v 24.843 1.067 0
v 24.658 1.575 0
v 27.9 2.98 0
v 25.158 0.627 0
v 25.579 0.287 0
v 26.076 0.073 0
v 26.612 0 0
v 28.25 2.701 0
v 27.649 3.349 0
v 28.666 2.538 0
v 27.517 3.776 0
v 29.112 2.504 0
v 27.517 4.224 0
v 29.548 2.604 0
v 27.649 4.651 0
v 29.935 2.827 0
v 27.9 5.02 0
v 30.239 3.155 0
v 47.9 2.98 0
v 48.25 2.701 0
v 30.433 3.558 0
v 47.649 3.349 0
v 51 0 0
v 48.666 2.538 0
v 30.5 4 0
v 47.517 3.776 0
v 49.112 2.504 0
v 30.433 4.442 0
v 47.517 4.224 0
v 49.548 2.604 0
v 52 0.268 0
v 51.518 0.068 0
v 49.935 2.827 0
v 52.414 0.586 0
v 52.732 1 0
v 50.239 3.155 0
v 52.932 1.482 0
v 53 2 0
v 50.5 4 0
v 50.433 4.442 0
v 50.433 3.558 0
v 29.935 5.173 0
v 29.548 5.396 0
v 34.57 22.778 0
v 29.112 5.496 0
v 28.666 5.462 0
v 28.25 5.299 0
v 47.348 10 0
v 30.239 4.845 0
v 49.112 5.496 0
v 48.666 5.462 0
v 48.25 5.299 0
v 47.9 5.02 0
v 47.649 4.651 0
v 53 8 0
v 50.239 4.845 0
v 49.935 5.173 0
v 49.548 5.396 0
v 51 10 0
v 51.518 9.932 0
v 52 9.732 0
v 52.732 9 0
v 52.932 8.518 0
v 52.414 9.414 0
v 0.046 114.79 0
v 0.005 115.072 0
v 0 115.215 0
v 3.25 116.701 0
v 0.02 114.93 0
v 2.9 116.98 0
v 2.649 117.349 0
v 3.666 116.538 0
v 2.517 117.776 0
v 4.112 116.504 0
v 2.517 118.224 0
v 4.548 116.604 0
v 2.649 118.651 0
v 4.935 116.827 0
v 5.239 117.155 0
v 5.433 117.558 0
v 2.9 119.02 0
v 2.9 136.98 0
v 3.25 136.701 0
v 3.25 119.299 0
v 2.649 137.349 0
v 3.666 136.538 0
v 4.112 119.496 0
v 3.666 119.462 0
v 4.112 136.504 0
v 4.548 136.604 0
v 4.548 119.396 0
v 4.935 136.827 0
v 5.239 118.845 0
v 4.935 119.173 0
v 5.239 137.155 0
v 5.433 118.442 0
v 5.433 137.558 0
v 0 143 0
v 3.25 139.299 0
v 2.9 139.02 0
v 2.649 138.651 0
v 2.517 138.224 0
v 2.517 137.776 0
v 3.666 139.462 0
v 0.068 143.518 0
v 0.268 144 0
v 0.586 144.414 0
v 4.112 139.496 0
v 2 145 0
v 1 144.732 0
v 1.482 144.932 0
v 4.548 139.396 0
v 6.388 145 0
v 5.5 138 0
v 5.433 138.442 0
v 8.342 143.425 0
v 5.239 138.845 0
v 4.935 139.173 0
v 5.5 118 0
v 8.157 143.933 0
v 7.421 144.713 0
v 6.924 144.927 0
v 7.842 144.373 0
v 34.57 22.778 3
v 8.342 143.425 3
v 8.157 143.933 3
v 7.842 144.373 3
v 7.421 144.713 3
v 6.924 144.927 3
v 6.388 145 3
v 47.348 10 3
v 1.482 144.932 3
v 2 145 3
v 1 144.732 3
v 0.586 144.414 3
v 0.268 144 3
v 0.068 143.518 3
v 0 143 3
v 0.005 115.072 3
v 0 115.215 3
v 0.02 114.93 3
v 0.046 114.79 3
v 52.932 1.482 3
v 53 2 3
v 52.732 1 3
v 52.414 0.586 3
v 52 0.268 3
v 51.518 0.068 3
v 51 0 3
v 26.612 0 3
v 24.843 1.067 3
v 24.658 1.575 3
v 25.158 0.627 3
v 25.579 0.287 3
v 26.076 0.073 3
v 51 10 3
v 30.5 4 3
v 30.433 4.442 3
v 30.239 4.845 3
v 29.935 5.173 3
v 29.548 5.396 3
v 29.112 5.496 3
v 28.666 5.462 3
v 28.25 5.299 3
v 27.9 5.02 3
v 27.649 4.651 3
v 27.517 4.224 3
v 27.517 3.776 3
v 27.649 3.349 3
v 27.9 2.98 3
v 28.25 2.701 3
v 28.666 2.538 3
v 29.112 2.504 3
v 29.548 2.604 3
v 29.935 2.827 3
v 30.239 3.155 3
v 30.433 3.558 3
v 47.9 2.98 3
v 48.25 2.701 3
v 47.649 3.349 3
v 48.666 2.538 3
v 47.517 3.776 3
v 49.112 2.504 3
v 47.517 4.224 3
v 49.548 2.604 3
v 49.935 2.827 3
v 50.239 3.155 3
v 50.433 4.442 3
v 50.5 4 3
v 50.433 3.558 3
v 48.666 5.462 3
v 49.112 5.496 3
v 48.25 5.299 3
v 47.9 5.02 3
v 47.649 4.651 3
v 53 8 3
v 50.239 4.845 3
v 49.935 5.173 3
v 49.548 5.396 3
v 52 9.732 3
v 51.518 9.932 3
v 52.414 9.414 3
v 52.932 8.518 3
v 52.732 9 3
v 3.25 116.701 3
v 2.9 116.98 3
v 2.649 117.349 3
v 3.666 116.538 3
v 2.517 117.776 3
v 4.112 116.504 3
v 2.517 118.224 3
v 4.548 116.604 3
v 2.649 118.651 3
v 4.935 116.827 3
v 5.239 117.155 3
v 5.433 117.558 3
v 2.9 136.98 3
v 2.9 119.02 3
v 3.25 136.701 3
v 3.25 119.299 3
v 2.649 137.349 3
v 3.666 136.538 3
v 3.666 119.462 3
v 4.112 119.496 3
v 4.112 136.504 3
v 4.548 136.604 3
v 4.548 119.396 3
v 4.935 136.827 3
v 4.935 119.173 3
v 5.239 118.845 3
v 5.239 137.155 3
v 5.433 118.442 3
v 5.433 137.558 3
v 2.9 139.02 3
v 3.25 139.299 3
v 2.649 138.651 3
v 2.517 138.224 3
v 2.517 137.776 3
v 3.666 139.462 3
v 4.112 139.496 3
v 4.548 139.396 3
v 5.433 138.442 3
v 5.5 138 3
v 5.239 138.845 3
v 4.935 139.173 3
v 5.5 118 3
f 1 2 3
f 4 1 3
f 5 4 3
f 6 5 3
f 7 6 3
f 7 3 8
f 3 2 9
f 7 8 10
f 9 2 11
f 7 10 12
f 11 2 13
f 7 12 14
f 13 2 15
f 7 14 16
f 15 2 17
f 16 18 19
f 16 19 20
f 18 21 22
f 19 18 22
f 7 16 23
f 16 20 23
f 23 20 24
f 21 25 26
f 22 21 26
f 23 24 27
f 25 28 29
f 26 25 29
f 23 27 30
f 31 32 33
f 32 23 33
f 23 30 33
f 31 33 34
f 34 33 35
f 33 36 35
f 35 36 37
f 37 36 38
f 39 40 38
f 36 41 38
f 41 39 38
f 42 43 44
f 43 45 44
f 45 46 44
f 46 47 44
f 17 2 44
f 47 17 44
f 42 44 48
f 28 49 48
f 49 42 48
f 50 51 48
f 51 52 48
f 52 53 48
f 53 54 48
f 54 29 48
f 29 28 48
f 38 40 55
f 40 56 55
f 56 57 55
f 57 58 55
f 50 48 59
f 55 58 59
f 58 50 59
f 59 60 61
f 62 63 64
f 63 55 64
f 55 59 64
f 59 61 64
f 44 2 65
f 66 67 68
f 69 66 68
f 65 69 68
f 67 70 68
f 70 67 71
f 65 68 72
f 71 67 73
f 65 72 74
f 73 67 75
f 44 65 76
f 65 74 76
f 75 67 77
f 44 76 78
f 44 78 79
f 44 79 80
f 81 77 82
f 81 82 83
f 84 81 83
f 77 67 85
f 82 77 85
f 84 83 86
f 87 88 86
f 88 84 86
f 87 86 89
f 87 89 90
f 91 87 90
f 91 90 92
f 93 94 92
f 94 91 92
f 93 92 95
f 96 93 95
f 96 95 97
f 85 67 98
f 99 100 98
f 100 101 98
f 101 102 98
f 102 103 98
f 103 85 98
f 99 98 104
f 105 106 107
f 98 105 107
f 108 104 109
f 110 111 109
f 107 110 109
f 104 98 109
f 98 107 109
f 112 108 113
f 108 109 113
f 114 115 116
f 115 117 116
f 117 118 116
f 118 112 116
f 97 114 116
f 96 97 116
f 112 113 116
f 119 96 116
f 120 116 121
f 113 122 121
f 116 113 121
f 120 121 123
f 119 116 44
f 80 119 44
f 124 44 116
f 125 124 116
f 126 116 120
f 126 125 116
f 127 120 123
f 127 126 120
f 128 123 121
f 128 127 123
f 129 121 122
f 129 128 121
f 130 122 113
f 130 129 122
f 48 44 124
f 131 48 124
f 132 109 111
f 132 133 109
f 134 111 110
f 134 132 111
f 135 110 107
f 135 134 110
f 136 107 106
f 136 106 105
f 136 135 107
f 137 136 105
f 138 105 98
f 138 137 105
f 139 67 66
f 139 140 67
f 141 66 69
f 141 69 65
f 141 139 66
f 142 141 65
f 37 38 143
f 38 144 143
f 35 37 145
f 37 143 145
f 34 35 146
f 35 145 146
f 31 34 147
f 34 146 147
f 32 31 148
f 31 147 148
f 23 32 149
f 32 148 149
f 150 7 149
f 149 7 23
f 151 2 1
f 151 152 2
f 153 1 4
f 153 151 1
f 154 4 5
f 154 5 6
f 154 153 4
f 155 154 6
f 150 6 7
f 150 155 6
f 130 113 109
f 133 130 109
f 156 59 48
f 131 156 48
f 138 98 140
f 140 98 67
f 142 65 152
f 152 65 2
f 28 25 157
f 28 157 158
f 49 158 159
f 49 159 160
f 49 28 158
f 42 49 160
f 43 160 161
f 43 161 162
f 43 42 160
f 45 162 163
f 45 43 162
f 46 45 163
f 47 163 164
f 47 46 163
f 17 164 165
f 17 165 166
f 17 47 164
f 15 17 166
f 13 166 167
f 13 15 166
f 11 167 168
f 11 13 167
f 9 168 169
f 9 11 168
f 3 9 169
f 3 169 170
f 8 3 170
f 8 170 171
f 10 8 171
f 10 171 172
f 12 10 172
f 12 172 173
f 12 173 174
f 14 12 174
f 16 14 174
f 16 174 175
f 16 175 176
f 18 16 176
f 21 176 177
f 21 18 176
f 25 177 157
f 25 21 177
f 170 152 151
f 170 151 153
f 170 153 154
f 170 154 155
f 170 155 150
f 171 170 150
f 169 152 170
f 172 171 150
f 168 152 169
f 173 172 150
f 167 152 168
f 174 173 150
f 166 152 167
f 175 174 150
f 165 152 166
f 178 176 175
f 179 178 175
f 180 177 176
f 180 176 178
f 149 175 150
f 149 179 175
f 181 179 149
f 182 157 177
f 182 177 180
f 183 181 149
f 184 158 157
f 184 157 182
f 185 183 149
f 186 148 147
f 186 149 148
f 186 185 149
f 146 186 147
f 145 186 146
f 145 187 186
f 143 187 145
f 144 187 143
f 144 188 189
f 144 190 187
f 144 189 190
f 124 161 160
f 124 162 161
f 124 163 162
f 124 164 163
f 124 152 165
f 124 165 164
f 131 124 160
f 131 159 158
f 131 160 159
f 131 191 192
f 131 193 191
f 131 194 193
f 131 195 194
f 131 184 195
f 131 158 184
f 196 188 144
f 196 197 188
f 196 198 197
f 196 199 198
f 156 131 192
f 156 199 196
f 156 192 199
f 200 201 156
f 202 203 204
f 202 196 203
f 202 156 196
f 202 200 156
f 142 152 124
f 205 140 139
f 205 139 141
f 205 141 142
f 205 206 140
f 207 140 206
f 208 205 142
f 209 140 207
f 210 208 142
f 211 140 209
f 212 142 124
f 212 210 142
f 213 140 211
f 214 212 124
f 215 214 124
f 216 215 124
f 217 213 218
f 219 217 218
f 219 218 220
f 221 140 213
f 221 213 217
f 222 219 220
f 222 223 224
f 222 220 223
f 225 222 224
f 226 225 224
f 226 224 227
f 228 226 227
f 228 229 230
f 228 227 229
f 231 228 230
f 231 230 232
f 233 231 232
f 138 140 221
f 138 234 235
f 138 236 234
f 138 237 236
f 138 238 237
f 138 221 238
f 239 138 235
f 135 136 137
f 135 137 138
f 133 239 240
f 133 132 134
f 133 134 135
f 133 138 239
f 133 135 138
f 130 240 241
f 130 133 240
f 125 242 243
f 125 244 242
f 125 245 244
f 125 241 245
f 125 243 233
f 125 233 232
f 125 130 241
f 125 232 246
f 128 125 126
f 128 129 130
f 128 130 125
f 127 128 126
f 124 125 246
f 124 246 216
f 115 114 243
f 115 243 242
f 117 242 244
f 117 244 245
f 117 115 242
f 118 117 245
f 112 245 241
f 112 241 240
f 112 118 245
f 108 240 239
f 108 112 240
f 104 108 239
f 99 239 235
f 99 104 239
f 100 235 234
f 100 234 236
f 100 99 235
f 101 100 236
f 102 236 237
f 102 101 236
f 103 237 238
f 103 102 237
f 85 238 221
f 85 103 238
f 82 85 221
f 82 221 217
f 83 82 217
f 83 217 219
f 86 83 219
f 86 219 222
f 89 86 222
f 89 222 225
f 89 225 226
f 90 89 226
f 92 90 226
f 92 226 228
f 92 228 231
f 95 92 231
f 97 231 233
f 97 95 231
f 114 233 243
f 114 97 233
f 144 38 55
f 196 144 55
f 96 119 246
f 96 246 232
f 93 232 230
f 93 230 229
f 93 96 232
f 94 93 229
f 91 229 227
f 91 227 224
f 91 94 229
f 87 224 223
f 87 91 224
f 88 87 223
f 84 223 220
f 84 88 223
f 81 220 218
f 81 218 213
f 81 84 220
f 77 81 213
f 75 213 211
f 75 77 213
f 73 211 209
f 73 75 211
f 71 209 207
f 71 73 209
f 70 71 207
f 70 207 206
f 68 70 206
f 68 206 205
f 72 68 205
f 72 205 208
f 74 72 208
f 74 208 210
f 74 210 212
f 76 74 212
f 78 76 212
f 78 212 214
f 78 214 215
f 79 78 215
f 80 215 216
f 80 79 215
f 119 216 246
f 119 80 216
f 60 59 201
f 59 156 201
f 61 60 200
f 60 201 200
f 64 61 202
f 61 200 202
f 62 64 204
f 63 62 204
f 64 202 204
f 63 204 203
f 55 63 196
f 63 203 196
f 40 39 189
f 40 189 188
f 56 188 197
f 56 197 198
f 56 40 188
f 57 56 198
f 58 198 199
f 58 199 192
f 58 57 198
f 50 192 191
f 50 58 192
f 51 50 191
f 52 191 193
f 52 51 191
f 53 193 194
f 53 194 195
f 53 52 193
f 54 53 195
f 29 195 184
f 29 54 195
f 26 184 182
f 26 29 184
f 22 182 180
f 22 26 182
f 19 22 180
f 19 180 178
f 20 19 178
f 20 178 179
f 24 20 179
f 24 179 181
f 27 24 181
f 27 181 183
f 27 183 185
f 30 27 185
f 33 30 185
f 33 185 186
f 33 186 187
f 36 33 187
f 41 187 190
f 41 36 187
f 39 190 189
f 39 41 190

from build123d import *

# Parameters (mm, degrees)
SKETCH_1_R      = 1.5
EXTRUDE_1_DEPTH = 3
CHAMFER_1_SIZE  = 10
CHAMFER_1_SIZE2 = 13.076224773
FILLET_1_R      = 2


with BuildPart() as part:
    # 草图1 → 凸台-拉伸1 (new body)
    with BuildSketch(Plane.XY):
        Polygon((0, 145), (0, 115), (25, 0), (53, 0), (53, 10), (37.347826087, 10), (8, 145), align=None)
        with Locations((4, 118)):
            Circle(SKETCH_1_R, mode=Mode.SUBTRACT)
        with Locations((4, 138)):
            Circle(SKETCH_1_R, mode=Mode.SUBTRACT)
        with Locations((49, 4)):
            Circle(SKETCH_1_R, mode=Mode.SUBTRACT)
        with Locations((29, 4)):
            Circle(SKETCH_1_R, mode=Mode.SUBTRACT)
    extrude(amount=EXTRUDE_1_DEPTH)

    # 倒角1
    chamfer_1_edges = [part.edges().sort_by_distance(p)[0] for p in [
        (37.347826087, 10, 1.5),
    ]]
    chamfer_1_side = [part.faces().sort_by_distance(p)[0] for p in [
        (45.173913043, 10, 1.5),
    ]]
    chamfer(chamfer_1_edges, length=CHAMFER_1_SIZE, length2=CHAMFER_1_SIZE2, reference=chamfer_1_side[0])

    # 圆角1
    fillet_1_edges = [part.edges().sort_by_distance(p)[0] for p in [
        (8, 145, 1.5),
        (53, 10, 1.5),
        (53, 0, 1.5),
        (25, 0, 1.5),
        (0, 115, 1.5),
        (0, 145, 1.5),
    ]]
    fillet(fillet_1_edges, radius=FILLET_1_R)


solid = part.part
